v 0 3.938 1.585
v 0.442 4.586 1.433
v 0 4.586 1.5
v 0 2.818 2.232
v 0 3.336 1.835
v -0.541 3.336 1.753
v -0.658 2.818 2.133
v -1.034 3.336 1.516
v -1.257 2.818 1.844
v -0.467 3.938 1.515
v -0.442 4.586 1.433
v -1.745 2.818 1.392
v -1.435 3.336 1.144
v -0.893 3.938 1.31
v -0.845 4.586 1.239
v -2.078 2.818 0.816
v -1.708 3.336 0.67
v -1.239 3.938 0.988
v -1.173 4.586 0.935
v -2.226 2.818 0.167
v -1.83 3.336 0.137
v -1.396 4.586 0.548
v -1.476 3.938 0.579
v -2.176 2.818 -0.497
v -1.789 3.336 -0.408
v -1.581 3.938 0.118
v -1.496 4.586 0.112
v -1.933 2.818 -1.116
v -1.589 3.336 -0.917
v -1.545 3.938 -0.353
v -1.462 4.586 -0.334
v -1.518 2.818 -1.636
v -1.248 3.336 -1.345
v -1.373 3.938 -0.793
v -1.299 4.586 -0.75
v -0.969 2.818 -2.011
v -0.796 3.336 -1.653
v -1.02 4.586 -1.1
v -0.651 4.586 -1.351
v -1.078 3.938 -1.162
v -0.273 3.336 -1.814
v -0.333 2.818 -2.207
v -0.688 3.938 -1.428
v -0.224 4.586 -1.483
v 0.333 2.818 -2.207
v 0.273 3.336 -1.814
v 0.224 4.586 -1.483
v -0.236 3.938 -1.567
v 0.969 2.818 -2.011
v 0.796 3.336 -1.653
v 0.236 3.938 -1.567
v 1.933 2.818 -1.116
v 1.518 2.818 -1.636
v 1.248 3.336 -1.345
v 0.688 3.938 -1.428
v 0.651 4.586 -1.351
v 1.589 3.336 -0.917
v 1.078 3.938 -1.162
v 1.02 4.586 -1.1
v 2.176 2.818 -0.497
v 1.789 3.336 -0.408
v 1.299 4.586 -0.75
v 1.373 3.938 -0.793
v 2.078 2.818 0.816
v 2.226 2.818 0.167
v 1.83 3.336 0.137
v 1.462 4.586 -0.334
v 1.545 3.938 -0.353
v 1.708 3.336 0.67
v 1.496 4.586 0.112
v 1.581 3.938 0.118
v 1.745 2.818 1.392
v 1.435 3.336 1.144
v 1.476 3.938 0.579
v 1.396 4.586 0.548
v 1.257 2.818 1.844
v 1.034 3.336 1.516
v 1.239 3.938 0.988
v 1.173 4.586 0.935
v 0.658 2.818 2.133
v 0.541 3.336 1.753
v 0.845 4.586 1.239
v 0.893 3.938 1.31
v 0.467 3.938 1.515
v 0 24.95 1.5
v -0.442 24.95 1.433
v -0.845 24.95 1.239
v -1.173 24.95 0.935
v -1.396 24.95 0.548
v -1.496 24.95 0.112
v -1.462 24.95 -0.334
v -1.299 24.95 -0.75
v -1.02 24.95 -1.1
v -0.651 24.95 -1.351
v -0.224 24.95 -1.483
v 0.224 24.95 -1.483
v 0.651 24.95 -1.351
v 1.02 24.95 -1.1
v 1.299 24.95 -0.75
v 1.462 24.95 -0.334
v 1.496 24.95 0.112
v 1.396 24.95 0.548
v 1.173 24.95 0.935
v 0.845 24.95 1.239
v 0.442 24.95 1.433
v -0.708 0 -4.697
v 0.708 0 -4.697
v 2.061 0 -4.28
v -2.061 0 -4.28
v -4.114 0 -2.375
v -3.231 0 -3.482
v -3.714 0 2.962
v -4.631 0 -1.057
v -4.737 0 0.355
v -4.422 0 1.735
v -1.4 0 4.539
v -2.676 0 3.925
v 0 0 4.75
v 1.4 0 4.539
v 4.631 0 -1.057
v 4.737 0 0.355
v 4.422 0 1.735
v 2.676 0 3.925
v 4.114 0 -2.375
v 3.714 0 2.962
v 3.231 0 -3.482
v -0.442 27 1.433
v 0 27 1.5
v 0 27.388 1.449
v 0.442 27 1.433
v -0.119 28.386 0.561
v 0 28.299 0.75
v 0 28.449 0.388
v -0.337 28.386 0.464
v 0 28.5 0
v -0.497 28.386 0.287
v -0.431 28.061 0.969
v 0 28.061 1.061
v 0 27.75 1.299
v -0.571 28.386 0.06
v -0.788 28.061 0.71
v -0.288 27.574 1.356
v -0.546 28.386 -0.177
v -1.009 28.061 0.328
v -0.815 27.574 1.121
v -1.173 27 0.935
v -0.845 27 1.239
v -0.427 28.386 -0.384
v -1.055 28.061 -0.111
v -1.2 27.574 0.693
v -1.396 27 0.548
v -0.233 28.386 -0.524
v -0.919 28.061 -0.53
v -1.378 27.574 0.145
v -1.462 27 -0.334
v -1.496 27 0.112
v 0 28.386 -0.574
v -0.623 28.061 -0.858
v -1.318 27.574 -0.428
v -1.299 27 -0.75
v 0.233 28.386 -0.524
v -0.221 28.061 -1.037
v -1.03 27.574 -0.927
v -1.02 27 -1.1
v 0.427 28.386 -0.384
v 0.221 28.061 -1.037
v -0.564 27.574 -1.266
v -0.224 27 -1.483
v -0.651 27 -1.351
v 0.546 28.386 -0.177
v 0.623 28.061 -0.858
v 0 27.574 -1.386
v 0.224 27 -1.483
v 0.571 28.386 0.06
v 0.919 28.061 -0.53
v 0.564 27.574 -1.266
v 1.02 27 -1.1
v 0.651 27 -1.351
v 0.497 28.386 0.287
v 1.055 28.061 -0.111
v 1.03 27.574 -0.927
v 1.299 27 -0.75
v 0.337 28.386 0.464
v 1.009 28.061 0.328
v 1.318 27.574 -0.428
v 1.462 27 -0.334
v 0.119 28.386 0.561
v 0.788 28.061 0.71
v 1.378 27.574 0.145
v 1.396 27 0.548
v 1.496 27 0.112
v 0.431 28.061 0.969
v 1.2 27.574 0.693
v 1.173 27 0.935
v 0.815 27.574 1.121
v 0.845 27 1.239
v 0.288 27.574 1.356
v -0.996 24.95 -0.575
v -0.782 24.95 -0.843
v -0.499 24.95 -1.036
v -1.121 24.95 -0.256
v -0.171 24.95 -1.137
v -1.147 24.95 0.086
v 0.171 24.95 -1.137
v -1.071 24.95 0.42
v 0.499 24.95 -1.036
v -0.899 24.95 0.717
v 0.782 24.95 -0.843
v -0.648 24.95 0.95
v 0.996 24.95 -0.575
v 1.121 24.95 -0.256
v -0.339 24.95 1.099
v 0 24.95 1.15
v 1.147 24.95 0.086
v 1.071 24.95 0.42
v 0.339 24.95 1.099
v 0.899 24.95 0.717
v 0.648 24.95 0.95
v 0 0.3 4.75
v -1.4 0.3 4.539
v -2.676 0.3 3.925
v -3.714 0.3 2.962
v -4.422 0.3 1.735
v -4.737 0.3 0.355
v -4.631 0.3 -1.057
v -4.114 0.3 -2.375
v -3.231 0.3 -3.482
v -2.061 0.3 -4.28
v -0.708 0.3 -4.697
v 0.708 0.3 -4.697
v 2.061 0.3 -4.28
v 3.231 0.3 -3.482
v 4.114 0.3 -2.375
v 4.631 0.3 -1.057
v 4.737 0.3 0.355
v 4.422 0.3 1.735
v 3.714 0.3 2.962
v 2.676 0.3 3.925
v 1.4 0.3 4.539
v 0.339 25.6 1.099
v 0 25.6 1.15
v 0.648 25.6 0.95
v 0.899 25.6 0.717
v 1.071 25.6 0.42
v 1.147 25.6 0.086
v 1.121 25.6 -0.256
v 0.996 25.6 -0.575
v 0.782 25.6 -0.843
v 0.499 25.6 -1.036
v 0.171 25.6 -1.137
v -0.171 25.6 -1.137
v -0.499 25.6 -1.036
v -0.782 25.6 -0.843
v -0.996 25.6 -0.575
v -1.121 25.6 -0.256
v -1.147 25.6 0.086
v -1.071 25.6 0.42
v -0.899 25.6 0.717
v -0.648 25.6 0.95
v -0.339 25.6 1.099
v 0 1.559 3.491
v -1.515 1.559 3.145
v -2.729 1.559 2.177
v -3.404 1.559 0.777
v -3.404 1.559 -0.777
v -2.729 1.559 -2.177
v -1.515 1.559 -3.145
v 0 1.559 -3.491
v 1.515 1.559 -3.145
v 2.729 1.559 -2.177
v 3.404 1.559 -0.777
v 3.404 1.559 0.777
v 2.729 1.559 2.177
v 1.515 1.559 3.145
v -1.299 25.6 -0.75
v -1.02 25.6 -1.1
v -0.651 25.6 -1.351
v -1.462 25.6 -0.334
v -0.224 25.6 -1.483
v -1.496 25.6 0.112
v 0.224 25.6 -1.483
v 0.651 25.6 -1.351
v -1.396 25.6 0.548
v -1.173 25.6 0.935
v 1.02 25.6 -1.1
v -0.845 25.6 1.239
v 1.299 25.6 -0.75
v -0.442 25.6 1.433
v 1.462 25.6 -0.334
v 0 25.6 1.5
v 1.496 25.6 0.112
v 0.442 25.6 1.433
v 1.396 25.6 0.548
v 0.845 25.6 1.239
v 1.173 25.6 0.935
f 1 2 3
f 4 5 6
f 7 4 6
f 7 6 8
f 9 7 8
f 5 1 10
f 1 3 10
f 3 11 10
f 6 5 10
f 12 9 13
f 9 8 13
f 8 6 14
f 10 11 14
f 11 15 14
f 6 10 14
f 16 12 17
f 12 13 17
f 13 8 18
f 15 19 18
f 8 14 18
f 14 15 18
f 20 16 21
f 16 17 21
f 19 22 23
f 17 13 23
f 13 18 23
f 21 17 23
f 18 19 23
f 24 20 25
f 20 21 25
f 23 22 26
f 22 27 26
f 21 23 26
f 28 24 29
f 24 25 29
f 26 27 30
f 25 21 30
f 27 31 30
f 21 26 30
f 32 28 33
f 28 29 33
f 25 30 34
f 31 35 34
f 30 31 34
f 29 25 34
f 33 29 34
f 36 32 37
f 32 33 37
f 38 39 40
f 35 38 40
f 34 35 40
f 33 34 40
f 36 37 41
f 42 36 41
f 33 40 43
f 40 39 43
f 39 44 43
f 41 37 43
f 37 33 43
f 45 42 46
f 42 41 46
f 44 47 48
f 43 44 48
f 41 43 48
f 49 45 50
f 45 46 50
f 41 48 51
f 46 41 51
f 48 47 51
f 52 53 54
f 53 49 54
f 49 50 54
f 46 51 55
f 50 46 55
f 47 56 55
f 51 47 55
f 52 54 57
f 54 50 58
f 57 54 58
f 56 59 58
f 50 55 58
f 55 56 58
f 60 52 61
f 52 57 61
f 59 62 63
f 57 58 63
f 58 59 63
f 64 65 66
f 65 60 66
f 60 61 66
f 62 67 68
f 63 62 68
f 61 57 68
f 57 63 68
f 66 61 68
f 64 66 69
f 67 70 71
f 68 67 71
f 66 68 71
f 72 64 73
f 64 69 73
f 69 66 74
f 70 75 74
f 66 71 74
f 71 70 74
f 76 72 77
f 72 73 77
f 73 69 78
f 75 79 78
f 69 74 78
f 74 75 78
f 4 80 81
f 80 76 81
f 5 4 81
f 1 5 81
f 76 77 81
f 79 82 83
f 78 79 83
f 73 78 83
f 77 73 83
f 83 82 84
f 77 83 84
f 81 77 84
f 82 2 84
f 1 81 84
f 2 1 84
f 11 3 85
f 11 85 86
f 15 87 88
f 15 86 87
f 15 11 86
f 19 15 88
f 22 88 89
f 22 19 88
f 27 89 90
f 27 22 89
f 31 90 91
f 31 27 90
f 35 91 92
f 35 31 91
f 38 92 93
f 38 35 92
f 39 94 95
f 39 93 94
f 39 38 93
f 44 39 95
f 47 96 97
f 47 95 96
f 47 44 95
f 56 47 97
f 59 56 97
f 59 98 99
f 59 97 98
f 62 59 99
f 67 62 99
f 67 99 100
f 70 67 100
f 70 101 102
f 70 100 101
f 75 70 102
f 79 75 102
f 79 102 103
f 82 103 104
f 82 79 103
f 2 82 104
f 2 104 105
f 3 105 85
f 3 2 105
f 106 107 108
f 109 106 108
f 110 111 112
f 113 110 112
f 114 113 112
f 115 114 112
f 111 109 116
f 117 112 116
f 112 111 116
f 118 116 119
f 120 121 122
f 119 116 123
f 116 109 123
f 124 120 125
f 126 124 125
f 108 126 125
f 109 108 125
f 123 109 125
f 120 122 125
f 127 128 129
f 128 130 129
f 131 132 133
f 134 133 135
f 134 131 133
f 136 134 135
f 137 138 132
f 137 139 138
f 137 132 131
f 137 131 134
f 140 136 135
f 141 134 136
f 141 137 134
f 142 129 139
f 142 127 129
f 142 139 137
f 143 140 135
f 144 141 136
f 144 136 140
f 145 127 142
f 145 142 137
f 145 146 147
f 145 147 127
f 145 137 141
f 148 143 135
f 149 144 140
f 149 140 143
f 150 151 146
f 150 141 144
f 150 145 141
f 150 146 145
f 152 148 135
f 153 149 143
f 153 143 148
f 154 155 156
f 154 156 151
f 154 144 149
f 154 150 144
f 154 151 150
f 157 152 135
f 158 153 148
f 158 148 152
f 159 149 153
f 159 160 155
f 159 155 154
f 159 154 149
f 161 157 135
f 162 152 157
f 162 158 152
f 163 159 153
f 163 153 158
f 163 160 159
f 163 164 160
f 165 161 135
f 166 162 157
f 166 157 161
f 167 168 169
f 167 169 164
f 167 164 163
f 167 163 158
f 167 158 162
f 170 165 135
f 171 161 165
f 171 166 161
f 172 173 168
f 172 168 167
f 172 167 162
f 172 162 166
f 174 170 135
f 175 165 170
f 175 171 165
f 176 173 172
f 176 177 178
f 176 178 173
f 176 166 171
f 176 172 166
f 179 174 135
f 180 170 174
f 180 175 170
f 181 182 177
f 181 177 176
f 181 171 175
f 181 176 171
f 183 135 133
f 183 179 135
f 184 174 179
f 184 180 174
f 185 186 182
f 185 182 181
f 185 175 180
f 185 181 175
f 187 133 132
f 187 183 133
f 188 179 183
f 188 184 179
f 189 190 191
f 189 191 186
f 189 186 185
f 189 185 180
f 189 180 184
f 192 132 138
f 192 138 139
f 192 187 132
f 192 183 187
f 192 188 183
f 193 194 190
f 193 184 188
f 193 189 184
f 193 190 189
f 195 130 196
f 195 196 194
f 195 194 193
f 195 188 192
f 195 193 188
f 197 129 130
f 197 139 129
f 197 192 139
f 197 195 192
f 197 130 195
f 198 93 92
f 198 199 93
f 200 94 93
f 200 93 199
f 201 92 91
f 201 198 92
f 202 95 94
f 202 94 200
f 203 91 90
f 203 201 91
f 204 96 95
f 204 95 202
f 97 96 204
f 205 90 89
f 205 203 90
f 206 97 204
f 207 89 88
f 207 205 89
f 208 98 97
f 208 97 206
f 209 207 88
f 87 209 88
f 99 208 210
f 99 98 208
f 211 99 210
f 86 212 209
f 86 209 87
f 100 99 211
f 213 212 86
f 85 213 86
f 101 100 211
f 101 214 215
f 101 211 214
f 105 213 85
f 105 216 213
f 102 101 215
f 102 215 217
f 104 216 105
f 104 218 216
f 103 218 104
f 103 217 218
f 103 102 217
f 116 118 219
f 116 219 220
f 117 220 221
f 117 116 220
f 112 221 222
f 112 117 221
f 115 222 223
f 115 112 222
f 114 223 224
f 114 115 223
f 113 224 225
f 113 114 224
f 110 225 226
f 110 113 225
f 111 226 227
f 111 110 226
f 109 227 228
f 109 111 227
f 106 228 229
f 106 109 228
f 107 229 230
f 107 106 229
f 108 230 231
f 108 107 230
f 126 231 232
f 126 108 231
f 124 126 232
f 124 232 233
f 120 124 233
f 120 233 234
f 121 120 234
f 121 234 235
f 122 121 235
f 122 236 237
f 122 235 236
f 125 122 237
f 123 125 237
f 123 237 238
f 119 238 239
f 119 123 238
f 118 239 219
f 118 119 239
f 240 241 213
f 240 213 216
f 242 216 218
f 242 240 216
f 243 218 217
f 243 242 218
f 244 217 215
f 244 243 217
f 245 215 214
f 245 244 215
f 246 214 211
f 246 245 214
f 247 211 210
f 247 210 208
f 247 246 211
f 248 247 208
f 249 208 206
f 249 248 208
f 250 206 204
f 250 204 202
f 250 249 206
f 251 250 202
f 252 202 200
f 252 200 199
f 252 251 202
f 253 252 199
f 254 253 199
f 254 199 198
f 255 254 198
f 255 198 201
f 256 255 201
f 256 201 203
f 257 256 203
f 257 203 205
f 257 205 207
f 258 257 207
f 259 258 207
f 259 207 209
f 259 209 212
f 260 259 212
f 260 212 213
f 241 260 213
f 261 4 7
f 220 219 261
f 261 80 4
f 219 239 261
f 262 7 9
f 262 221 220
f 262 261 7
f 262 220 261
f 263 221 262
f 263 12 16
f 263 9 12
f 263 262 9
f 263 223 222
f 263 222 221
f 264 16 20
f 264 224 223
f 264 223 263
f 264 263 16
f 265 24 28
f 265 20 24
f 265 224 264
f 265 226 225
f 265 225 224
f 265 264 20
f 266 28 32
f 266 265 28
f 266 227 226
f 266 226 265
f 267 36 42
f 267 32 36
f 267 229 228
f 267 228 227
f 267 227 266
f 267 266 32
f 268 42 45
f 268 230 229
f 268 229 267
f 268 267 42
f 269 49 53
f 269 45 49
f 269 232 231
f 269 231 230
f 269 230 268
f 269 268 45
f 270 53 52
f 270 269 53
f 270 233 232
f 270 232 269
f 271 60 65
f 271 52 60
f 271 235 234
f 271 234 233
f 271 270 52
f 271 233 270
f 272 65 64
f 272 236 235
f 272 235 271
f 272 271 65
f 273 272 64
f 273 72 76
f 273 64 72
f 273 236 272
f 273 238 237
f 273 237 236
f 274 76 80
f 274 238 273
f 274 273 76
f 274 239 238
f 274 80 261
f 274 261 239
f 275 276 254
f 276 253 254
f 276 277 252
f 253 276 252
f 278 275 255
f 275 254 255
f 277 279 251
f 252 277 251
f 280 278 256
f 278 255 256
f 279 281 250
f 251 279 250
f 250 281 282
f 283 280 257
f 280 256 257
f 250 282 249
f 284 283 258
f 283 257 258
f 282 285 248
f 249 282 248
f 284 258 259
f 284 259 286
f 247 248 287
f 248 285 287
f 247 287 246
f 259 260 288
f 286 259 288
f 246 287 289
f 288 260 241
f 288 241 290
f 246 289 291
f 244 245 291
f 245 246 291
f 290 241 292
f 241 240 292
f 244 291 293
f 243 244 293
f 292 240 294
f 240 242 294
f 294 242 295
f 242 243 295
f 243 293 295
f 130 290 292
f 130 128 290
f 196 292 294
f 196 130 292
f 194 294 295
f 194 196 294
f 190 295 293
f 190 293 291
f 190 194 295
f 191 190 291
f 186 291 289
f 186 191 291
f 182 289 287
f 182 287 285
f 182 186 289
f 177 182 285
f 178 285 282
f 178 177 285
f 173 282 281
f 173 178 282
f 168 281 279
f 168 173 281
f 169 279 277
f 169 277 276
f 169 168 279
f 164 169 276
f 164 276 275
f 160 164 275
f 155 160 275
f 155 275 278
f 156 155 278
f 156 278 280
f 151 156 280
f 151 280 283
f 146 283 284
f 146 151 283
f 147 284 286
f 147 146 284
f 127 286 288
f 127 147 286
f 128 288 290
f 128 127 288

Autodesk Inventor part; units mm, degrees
ref_plane "YZ Plane" through (0, 0, 0) normal (1, 0, 0) x (0, 1, 0)
ref_plane "XZ Plane" through (0, 0, 0) normal (0, 1, 0) x (-1, 0, 0)
ref_plane "XY Plane" through (0, 0, 0) normal (0, 0, 1) x (1, 0, 0)
sketch "Sketch1" plane through (0, 0, 0) normal (1, 0, 0) x (0, 1, 0)
  line L0 (0, 0) -> (28.5, 0)
  line L1 (24.95, 1.5) -> (4.5855, 1.5)
  line L2 (2.8178, 2.2322) -> (0.3, 4.75)
  line L3 (0.3, 4.75) -> (0, 4.75)
  line L4 (0, 4.75) -> (0, 0)
  arc A0 (28.5, 0) -> (27, 1.5) centre (27, 0) ccw
  line L5 (24.95, 1.5) -> (24.95, 1.15)
  line L6 (24.95, 1.15) -> (25.6, 1.15)
  line L7 (25.6, 1.15) -> (25.6, 1.5)
  line L8 (25.6, 1.5) -> (27, 1.5)
  arc A1 (2.8178, 2.2322) -> (4.5855, 1.5) centre (4.5855, 4) ccw
  dimension "d1" = 4.75
  dimension "d2" = 1.5
  dimension "d3" = 0.3
  dimension "d4" = 45
  dimension "d5" = 1.5
  dimension "d6" = 1.15
  dimension "d8" = 0.65
  dimension "d9" = 1.4
  dimension "d10" = 27
  dimension "d11" = 2.5
revolve "Revolution1" add sketch "Sketch1" angle 360 about axis through (0, 0, 0) along (0, 1, 0)
properties part number "Component 24 (Valve)"
